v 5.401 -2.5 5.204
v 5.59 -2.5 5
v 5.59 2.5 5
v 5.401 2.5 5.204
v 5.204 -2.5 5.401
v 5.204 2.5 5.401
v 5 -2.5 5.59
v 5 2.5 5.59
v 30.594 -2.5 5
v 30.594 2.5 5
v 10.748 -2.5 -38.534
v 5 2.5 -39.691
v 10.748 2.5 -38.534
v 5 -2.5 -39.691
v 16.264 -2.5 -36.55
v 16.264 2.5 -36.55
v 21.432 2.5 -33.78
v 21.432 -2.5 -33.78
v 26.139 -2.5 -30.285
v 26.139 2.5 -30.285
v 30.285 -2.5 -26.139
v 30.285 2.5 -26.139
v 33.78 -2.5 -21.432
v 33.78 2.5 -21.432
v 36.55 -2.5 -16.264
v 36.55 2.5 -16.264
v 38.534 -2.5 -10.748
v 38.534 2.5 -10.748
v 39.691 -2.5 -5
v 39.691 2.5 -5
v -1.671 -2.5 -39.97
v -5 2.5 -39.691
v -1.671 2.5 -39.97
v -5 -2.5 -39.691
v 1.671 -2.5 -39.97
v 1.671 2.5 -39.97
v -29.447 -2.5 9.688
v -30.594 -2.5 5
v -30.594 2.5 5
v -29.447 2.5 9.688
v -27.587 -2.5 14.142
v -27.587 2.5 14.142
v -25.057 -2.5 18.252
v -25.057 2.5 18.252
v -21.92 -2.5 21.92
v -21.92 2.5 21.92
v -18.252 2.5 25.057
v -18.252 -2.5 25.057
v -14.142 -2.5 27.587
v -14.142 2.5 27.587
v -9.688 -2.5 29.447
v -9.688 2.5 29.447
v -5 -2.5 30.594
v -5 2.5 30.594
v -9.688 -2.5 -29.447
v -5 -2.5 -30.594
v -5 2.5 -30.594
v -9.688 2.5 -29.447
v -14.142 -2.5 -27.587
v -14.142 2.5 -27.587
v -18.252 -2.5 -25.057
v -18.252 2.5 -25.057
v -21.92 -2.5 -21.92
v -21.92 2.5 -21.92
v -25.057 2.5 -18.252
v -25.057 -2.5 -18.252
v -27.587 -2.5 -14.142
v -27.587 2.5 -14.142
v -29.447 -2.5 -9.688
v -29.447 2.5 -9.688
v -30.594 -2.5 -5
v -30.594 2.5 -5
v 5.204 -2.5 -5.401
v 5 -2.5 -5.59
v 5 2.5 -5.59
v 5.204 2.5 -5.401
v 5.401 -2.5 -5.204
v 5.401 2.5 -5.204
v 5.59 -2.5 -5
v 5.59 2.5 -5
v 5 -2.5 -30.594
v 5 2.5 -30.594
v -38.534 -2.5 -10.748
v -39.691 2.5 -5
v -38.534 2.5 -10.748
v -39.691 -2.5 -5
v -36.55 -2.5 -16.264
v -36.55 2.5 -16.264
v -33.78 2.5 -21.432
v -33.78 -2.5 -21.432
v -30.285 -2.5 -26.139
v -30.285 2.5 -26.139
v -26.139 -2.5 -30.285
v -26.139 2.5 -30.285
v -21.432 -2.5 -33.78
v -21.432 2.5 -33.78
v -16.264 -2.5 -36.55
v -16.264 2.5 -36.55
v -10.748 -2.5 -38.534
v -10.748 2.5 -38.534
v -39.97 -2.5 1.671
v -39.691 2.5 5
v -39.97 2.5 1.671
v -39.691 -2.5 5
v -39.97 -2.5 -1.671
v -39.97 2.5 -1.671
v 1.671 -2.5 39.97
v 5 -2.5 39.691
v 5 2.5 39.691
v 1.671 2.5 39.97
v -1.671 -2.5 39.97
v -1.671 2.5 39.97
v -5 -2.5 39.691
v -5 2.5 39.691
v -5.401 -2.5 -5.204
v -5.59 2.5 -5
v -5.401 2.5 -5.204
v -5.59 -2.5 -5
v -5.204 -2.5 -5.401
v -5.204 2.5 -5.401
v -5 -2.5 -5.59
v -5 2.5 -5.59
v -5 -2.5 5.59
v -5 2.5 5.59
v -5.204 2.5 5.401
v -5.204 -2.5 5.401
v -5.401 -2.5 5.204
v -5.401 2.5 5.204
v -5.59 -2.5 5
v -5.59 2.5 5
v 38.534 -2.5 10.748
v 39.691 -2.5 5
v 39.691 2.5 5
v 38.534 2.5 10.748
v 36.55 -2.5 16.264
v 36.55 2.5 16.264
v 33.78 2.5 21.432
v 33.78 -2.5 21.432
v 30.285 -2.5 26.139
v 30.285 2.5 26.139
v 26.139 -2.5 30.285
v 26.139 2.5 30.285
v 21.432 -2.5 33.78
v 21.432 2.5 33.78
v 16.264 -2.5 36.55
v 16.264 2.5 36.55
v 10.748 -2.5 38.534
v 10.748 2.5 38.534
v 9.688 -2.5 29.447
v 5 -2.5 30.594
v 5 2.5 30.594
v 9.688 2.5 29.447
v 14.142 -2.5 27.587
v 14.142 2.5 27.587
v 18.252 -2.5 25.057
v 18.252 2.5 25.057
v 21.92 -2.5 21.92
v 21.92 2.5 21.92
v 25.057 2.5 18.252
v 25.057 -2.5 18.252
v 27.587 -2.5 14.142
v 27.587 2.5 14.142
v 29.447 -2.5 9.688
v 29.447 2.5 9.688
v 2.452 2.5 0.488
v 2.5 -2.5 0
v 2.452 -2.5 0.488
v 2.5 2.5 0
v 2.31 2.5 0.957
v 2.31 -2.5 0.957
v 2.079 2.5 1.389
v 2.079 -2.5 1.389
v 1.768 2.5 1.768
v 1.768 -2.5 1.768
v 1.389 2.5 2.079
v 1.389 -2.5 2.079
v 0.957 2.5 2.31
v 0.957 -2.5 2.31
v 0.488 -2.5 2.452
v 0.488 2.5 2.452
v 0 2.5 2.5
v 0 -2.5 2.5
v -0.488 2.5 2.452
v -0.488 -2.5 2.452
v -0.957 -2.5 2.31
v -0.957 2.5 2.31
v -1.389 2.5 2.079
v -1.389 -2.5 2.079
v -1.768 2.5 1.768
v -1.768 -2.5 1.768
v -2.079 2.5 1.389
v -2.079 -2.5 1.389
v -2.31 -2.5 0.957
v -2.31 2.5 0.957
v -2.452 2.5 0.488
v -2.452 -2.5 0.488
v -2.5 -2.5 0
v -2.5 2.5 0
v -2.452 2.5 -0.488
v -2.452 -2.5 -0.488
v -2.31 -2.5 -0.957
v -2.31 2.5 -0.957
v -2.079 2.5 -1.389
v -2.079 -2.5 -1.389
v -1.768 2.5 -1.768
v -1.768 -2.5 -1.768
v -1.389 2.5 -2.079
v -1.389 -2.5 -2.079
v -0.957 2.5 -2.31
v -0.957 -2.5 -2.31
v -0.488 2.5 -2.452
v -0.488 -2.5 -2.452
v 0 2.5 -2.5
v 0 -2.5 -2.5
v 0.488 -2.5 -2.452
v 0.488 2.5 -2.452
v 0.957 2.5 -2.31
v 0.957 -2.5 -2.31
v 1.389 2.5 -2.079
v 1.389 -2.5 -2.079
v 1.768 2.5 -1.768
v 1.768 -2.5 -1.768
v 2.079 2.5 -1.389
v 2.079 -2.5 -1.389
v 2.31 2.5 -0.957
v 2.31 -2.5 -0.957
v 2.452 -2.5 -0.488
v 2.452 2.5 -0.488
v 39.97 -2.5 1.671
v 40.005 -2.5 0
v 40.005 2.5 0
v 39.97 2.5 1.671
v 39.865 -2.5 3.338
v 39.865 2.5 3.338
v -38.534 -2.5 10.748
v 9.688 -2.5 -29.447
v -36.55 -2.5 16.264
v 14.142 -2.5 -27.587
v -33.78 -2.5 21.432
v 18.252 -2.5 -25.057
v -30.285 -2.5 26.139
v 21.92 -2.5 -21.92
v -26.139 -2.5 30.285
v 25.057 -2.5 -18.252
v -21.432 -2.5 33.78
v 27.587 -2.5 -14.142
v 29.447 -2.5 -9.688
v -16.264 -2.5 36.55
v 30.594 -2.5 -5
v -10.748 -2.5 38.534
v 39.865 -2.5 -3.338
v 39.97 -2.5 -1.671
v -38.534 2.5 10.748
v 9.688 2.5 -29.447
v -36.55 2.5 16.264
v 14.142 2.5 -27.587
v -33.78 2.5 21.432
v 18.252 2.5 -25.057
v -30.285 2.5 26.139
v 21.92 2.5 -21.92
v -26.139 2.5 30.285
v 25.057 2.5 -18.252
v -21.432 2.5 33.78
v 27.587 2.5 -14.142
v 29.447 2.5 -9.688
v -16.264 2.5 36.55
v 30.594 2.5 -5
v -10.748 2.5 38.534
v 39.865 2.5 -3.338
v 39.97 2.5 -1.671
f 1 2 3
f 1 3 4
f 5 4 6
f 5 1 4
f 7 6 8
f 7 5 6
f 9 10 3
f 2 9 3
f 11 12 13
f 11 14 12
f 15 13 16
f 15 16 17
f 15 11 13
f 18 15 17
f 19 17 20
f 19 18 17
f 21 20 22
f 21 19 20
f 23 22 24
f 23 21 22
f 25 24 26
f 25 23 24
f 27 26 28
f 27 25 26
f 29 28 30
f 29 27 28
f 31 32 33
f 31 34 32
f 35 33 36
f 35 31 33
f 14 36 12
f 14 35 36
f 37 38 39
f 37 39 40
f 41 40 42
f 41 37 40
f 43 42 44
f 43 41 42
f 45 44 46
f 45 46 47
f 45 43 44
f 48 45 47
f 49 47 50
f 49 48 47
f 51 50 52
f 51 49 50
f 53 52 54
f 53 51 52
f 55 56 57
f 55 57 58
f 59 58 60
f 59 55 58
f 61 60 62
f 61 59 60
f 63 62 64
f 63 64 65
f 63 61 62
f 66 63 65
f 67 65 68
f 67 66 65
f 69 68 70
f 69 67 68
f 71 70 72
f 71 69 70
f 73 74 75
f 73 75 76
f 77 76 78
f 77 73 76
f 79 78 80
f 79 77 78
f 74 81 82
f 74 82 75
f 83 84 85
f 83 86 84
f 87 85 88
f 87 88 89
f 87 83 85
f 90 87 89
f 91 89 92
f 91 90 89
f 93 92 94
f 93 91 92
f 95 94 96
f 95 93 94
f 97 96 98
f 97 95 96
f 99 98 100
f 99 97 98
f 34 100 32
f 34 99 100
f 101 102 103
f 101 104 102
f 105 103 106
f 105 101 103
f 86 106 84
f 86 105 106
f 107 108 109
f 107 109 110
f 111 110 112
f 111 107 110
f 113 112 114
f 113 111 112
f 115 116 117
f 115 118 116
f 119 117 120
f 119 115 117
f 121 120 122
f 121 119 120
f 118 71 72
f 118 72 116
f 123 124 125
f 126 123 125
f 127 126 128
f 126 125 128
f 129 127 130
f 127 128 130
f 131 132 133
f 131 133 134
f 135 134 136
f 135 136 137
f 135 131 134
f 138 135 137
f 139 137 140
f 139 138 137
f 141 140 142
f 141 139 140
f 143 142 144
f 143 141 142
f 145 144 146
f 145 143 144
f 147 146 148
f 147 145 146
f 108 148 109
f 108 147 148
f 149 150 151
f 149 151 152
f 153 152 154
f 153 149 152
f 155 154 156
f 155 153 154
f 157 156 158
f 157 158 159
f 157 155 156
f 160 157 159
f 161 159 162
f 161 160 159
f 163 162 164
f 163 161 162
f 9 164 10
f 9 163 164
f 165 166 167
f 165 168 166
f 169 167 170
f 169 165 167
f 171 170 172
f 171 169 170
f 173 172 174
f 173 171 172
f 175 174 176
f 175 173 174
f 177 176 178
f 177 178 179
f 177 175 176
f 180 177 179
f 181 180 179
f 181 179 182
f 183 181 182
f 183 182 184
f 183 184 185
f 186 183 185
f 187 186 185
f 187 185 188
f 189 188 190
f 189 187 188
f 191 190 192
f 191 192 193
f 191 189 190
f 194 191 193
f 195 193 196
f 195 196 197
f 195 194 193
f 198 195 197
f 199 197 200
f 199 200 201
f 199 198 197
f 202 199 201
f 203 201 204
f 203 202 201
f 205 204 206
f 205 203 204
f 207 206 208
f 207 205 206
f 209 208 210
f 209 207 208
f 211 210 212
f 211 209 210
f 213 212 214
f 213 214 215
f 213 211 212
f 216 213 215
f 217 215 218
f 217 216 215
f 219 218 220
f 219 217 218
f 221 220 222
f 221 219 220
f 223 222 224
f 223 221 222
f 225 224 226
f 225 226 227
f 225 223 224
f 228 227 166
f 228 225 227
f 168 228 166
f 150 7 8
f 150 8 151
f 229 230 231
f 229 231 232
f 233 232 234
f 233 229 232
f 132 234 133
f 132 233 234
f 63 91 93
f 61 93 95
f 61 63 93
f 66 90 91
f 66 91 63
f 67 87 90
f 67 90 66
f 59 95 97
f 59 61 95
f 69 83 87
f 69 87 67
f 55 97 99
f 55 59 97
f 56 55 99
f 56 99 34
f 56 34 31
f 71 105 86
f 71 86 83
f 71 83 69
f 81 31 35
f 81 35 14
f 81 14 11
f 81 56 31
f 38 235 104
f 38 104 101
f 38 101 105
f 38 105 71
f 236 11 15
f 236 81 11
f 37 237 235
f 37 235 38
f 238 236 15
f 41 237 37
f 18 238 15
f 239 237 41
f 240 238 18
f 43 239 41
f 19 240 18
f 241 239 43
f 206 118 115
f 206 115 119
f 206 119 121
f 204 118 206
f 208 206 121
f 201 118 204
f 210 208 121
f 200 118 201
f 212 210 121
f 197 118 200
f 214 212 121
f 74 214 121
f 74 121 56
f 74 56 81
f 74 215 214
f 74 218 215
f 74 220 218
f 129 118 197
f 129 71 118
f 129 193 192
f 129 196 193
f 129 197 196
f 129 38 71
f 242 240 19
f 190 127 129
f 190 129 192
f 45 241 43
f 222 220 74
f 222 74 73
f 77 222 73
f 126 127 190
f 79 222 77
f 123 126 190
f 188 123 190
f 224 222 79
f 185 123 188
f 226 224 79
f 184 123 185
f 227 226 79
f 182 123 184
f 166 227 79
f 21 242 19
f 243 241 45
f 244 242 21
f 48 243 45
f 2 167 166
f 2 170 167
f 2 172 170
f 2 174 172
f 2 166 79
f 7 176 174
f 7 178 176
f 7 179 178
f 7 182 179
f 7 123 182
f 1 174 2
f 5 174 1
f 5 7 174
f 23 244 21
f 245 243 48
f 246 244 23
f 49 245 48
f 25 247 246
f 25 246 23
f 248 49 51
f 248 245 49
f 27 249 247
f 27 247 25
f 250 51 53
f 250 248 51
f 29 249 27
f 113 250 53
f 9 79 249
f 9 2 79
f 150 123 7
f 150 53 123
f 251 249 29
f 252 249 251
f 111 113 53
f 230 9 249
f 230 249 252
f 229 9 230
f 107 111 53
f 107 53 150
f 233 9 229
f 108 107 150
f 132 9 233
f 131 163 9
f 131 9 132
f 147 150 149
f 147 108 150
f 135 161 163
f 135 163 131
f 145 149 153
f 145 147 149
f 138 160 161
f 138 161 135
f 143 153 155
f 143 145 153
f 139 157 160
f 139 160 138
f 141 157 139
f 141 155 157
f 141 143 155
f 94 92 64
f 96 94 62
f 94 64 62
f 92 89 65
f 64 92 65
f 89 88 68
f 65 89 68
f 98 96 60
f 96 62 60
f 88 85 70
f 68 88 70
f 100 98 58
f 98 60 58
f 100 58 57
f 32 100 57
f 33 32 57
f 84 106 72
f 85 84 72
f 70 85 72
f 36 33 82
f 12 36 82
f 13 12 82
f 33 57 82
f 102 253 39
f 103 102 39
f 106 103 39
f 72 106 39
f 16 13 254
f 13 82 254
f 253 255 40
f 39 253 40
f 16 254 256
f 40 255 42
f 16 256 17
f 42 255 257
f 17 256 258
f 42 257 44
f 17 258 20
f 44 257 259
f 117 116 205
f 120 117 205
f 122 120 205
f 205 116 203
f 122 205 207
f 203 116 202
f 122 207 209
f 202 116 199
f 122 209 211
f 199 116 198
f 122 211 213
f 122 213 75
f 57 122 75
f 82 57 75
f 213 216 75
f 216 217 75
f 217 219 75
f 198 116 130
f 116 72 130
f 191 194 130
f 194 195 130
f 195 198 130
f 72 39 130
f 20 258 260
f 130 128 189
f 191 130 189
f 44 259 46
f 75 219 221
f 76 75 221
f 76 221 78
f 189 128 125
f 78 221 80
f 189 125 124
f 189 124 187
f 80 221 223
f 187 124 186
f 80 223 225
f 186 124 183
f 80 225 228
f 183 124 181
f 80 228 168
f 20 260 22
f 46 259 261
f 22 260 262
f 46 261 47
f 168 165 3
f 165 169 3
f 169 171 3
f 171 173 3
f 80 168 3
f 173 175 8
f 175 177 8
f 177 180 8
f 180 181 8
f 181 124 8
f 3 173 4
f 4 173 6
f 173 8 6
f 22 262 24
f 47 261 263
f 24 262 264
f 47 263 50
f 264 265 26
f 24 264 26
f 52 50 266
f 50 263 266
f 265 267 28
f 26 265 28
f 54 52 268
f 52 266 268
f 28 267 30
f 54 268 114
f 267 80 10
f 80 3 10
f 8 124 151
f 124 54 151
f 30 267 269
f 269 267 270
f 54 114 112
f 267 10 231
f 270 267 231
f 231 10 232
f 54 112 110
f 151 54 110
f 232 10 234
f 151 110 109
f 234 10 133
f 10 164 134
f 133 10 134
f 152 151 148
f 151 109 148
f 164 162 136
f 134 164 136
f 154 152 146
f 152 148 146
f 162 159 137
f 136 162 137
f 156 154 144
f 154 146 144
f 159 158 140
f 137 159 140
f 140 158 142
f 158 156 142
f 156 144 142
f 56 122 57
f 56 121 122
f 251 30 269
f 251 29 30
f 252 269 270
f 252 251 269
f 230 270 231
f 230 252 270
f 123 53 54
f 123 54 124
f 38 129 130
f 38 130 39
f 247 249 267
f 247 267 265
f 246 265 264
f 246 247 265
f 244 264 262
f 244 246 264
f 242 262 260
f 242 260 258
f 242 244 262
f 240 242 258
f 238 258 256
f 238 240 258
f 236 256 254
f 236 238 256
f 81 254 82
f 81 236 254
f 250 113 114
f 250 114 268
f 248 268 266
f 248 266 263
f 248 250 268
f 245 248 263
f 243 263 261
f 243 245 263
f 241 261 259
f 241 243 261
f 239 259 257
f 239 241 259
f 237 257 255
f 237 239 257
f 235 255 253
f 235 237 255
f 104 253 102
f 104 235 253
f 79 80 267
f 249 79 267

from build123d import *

# Parameters (mm, degrees)
F0_R     = 2.5
F1_DEPTH = 2.5


with BuildPart() as f1:
    # F0 (on Front) → F1 (new body, symmetric)
    with BuildSketch(Plane.XZ):
        with BuildLine():
            ThreePointArc((39.691309, -5), (39.9265, -2.504915), (40.005, 0))
            ThreePointArc((40.005, 0), (39.9265, 2.504915), (39.691309, 5))
            ThreePointArc((39.691309, 5), (28.287807, 28.287807), (5, 39.691309))
            ThreePointArc((5, 39.691309), (0, 40.005), (-5, 39.691309))
            ThreePointArc((-5, 39.691309), (-28.287807, 28.287807), (-39.691309, 5))
            ThreePointArc((-39.691309, 5), (-40.005, 0), (-39.691309, -5))
            ThreePointArc((-39.691309, -5), (-28.287807, -28.287807), (-5, -39.691309))
            ThreePointArc((-5, -39.691309), (0, -40.005), (5, -39.691309))
            ThreePointArc((5, -39.691309), (28.287807, -28.287807), (39.691309, -5))
        make_face()
        with BuildLine():
            ThreePointArc((-5, -30.594117), (-21.92031, -21.92031), (-30.594117, -5))
            Line((-30.594117, -5), (-5.59017, -5))
            ThreePointArc((-5.59017, -5), (-5.303301, -5.303301), (-5, -5.59017))
            Line((-5, -5.59017), (-5, -30.594117))
        make_face(mode=Mode.SUBTRACT)
        with BuildLine():
            ThreePointArc((5, -5.59017), (5.303301, -5.303301), (5.59017, -5))
            Line((5.59017, -5), (30.594117, -5))
            ThreePointArc((30.594117, -5), (21.92031, -21.92031), (5, -30.594117))
            Line((5, -30.594117), (5, -5.59017))
        make_face(mode=Mode.SUBTRACT)
        with BuildLine():
            Line((-5, 30.594117), (-5, 5.59017))
            ThreePointArc((-5, 5.59017), (-5.303301, 5.303301), (-5.59017, 5))
            Line((-5.59017, 5), (-30.594117, 5))
            ThreePointArc((-30.594117, 5), (-21.92031, 21.92031), (-5, 30.594117))
        make_face(mode=Mode.SUBTRACT)
        Circle(F0_R, mode=Mode.SUBTRACT)
        with BuildLine():
            Line((30.594117, 5), (5.59017, 5))
            ThreePointArc((5.59017, 5), (5.303301, 5.303301), (5, 5.59017))
            Line((5, 5.59017), (5, 30.594117))
            ThreePointArc((5, 30.594117), (21.92031, 21.92031), (30.594117, 5))
        make_face(mode=Mode.SUBTRACT)
    extrude(amount=F1_DEPTH, both=True)


solid = f1.part
